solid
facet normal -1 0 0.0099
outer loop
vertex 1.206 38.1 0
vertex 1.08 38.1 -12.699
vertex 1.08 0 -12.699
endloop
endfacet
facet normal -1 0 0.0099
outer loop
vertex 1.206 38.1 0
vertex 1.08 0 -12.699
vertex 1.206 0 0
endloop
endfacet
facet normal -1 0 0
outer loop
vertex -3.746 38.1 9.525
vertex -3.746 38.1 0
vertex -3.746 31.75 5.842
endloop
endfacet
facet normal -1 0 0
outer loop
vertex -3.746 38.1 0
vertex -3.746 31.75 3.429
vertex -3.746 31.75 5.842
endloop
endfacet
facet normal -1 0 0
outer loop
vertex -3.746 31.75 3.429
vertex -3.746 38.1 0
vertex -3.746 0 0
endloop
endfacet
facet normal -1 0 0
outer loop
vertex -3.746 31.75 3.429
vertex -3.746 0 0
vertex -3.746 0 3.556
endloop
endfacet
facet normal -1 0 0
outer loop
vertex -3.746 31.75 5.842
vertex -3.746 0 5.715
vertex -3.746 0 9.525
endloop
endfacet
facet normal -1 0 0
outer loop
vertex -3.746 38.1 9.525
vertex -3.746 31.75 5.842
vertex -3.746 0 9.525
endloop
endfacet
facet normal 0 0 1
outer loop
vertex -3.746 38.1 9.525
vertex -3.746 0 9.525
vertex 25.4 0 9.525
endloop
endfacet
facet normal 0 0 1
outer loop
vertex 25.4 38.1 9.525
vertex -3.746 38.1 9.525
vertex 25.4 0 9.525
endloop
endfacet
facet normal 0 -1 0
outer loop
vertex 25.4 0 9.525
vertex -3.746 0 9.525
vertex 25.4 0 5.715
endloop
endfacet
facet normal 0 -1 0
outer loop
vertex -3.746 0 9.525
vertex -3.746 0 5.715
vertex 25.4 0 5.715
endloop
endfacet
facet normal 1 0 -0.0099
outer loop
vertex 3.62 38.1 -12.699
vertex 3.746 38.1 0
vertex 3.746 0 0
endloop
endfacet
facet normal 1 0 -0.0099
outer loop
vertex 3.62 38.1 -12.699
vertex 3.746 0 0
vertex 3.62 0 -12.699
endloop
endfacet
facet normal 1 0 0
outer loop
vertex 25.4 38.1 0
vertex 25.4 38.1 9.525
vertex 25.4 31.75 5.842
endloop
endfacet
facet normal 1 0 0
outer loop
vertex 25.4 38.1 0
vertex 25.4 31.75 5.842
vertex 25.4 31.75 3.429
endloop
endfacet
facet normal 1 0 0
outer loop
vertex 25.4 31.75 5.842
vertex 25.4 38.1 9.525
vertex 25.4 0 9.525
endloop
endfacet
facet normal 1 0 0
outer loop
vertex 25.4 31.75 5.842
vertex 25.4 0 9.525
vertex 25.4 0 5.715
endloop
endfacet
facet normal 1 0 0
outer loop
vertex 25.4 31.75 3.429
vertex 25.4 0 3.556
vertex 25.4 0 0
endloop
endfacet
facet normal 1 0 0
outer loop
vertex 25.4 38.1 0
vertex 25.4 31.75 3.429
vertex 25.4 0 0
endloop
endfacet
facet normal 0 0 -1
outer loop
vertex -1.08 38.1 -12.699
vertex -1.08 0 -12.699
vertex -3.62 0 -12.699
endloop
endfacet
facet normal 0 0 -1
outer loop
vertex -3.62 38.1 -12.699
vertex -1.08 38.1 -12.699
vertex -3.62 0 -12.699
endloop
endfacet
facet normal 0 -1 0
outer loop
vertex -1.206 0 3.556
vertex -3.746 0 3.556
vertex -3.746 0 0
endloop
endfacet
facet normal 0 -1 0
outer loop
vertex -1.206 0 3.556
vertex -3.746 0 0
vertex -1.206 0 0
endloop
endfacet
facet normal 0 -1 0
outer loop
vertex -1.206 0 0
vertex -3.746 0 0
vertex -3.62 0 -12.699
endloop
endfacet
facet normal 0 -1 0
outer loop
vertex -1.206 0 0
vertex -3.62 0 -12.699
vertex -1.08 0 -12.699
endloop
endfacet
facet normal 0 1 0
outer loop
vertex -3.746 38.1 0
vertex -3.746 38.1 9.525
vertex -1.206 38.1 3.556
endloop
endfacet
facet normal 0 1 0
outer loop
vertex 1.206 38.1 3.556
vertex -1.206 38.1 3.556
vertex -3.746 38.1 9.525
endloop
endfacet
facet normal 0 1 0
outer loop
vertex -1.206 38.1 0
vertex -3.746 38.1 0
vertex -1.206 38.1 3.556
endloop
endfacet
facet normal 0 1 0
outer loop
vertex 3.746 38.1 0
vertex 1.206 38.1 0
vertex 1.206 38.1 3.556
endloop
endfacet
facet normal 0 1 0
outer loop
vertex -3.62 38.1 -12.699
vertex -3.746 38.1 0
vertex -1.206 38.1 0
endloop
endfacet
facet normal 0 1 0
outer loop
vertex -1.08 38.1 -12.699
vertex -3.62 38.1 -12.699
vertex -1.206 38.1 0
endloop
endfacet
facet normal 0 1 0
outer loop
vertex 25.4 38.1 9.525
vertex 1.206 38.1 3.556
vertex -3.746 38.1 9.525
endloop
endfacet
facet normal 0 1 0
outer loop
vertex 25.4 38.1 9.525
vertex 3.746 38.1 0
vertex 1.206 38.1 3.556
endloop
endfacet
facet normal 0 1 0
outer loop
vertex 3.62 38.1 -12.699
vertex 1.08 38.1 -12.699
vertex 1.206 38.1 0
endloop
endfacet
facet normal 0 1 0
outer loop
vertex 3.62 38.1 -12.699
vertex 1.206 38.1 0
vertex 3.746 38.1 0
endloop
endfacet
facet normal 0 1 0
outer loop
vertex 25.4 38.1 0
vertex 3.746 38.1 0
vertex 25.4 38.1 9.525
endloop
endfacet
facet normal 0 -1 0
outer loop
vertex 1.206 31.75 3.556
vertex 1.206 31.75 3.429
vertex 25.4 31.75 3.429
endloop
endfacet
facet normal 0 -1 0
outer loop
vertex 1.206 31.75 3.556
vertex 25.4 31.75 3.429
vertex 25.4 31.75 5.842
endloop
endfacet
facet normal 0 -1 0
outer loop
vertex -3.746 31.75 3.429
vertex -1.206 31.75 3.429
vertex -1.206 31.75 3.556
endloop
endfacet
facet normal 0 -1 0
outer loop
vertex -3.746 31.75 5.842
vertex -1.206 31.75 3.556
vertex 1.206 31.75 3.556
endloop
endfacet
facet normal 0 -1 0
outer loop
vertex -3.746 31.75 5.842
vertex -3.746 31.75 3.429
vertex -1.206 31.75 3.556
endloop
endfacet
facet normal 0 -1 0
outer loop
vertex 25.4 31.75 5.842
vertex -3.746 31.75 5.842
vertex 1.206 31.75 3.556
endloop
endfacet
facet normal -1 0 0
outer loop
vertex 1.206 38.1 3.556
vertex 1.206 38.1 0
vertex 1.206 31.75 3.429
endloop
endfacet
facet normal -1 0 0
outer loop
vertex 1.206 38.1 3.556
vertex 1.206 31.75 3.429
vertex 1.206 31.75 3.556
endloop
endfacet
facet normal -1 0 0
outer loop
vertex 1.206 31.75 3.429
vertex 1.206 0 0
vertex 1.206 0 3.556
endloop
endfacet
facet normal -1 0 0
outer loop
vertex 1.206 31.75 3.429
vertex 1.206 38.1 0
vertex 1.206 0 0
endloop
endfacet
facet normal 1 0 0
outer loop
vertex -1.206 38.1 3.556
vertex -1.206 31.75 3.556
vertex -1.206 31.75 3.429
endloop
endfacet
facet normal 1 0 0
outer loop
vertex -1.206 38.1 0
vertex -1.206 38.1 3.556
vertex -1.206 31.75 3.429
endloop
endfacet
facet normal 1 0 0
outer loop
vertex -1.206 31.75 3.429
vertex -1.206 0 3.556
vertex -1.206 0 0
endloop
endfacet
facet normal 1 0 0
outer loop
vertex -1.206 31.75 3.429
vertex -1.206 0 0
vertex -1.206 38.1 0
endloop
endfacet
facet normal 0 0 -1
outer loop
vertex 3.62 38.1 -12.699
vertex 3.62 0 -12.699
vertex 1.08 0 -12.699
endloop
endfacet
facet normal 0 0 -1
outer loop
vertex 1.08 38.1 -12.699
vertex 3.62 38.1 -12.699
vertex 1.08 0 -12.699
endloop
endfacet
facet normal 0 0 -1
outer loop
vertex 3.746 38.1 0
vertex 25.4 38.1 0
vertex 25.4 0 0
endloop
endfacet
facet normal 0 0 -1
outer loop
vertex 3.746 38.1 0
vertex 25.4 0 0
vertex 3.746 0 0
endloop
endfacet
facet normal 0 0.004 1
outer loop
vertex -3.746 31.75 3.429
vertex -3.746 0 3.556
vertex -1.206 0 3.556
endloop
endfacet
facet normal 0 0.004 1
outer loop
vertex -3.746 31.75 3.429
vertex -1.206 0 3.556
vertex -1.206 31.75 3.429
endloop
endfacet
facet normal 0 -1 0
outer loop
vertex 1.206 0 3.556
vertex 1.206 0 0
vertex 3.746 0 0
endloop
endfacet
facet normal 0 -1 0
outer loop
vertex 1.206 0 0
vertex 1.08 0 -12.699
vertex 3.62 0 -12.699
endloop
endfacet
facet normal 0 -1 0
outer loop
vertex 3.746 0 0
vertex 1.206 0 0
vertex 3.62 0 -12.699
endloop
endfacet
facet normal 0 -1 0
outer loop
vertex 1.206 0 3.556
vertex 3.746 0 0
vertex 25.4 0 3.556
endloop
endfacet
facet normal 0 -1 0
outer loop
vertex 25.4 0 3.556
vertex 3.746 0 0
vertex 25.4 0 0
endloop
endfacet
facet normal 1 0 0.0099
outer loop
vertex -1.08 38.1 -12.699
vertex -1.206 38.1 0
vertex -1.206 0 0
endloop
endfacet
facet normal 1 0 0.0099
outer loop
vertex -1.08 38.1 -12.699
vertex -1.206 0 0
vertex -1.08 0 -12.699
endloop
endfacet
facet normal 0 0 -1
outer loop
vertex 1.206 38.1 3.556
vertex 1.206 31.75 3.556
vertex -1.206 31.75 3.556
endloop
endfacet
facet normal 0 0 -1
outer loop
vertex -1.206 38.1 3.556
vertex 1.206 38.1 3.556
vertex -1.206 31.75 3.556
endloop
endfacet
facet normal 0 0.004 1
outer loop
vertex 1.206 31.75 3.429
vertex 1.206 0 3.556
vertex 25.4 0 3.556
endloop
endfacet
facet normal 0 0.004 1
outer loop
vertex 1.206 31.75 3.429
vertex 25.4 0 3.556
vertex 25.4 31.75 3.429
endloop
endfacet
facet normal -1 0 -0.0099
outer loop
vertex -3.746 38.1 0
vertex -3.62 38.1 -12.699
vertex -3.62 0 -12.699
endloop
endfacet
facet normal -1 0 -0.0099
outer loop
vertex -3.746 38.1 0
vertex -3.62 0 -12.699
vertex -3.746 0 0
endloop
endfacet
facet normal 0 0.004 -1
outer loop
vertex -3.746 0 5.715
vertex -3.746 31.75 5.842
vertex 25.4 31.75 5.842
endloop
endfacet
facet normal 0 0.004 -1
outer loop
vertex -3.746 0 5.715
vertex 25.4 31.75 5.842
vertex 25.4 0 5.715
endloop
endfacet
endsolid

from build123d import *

# Parameters (mm, degrees)
BOSS_EXTRUDE1_DEPTH     = 38.1
SKETCH2_3_W             = 12.7
SKETCH2_3_H             = 9.525
SKETCH2_3_W_2           = 8.9535
ARM_RIGHT_DEPTH         = 38.1
CUT_EXTRUDE1_DEPTH      = 48.518879101
CUT_EXTRUDE1_DEPTH_BACK = 48.518879101


with BuildPart() as part:
    # Sketch2 → Boss-Extrude1 (new body)
    with BuildSketch(Plane(origin=(0, 0, 0), x_dir=(1, 0, 0), z_dir=(0, 1, 0))):
        Polygon((-3.6195, 12.699364984), (-3.7465, 0), (-3.7465, -9.525), (3.7465, -9.525), (3.7465, 0), (3.6195, 12.699364984), (1.0795, 12.699364984), (1.2065, 0), (1.2065, -3.556), (-1.2065, -3.556), (-1.2065, 0), (-1.0795, 12.699364984), align=None)
    extrude(amount=BOSS_EXTRUDE1_DEPTH)

    # Sketch2<3> → Arm Right (add)
    with BuildSketch(Plane(origin=(0, 0, 0), x_dir=(1, 0, 0), z_dir=(0, 1, 0))):
        with Locations((19.05, -4.7625)):
            Rectangle(SKETCH2_3_W, SKETCH2_3_H)
        with Locations((8.22325, -4.7625)):
            Rectangle(SKETCH2_3_W_2, SKETCH2_3_H)
    extrude(amount=ARM_RIGHT_DEPTH)

    # Sketch3 → Cut-Extrude1 (cut, two sides: drawn at the far end of the back side and taken through both)
    with BuildSketch(Plane(origin=(0, 0, 0), x_dir=(0, 0, -1), z_dir=(1, 0, 0)).offset(-CUT_EXTRUDE1_DEPTH_BACK)):
        Polygon((-5.715, 0), (-3.556, 0), (-3.429, 31.75), (-5.842, 31.75), align=None)
    extrude(amount=CUT_EXTRUDE1_DEPTH + CUT_EXTRUDE1_DEPTH_BACK, mode=Mode.SUBTRACT)


solid = part.part
